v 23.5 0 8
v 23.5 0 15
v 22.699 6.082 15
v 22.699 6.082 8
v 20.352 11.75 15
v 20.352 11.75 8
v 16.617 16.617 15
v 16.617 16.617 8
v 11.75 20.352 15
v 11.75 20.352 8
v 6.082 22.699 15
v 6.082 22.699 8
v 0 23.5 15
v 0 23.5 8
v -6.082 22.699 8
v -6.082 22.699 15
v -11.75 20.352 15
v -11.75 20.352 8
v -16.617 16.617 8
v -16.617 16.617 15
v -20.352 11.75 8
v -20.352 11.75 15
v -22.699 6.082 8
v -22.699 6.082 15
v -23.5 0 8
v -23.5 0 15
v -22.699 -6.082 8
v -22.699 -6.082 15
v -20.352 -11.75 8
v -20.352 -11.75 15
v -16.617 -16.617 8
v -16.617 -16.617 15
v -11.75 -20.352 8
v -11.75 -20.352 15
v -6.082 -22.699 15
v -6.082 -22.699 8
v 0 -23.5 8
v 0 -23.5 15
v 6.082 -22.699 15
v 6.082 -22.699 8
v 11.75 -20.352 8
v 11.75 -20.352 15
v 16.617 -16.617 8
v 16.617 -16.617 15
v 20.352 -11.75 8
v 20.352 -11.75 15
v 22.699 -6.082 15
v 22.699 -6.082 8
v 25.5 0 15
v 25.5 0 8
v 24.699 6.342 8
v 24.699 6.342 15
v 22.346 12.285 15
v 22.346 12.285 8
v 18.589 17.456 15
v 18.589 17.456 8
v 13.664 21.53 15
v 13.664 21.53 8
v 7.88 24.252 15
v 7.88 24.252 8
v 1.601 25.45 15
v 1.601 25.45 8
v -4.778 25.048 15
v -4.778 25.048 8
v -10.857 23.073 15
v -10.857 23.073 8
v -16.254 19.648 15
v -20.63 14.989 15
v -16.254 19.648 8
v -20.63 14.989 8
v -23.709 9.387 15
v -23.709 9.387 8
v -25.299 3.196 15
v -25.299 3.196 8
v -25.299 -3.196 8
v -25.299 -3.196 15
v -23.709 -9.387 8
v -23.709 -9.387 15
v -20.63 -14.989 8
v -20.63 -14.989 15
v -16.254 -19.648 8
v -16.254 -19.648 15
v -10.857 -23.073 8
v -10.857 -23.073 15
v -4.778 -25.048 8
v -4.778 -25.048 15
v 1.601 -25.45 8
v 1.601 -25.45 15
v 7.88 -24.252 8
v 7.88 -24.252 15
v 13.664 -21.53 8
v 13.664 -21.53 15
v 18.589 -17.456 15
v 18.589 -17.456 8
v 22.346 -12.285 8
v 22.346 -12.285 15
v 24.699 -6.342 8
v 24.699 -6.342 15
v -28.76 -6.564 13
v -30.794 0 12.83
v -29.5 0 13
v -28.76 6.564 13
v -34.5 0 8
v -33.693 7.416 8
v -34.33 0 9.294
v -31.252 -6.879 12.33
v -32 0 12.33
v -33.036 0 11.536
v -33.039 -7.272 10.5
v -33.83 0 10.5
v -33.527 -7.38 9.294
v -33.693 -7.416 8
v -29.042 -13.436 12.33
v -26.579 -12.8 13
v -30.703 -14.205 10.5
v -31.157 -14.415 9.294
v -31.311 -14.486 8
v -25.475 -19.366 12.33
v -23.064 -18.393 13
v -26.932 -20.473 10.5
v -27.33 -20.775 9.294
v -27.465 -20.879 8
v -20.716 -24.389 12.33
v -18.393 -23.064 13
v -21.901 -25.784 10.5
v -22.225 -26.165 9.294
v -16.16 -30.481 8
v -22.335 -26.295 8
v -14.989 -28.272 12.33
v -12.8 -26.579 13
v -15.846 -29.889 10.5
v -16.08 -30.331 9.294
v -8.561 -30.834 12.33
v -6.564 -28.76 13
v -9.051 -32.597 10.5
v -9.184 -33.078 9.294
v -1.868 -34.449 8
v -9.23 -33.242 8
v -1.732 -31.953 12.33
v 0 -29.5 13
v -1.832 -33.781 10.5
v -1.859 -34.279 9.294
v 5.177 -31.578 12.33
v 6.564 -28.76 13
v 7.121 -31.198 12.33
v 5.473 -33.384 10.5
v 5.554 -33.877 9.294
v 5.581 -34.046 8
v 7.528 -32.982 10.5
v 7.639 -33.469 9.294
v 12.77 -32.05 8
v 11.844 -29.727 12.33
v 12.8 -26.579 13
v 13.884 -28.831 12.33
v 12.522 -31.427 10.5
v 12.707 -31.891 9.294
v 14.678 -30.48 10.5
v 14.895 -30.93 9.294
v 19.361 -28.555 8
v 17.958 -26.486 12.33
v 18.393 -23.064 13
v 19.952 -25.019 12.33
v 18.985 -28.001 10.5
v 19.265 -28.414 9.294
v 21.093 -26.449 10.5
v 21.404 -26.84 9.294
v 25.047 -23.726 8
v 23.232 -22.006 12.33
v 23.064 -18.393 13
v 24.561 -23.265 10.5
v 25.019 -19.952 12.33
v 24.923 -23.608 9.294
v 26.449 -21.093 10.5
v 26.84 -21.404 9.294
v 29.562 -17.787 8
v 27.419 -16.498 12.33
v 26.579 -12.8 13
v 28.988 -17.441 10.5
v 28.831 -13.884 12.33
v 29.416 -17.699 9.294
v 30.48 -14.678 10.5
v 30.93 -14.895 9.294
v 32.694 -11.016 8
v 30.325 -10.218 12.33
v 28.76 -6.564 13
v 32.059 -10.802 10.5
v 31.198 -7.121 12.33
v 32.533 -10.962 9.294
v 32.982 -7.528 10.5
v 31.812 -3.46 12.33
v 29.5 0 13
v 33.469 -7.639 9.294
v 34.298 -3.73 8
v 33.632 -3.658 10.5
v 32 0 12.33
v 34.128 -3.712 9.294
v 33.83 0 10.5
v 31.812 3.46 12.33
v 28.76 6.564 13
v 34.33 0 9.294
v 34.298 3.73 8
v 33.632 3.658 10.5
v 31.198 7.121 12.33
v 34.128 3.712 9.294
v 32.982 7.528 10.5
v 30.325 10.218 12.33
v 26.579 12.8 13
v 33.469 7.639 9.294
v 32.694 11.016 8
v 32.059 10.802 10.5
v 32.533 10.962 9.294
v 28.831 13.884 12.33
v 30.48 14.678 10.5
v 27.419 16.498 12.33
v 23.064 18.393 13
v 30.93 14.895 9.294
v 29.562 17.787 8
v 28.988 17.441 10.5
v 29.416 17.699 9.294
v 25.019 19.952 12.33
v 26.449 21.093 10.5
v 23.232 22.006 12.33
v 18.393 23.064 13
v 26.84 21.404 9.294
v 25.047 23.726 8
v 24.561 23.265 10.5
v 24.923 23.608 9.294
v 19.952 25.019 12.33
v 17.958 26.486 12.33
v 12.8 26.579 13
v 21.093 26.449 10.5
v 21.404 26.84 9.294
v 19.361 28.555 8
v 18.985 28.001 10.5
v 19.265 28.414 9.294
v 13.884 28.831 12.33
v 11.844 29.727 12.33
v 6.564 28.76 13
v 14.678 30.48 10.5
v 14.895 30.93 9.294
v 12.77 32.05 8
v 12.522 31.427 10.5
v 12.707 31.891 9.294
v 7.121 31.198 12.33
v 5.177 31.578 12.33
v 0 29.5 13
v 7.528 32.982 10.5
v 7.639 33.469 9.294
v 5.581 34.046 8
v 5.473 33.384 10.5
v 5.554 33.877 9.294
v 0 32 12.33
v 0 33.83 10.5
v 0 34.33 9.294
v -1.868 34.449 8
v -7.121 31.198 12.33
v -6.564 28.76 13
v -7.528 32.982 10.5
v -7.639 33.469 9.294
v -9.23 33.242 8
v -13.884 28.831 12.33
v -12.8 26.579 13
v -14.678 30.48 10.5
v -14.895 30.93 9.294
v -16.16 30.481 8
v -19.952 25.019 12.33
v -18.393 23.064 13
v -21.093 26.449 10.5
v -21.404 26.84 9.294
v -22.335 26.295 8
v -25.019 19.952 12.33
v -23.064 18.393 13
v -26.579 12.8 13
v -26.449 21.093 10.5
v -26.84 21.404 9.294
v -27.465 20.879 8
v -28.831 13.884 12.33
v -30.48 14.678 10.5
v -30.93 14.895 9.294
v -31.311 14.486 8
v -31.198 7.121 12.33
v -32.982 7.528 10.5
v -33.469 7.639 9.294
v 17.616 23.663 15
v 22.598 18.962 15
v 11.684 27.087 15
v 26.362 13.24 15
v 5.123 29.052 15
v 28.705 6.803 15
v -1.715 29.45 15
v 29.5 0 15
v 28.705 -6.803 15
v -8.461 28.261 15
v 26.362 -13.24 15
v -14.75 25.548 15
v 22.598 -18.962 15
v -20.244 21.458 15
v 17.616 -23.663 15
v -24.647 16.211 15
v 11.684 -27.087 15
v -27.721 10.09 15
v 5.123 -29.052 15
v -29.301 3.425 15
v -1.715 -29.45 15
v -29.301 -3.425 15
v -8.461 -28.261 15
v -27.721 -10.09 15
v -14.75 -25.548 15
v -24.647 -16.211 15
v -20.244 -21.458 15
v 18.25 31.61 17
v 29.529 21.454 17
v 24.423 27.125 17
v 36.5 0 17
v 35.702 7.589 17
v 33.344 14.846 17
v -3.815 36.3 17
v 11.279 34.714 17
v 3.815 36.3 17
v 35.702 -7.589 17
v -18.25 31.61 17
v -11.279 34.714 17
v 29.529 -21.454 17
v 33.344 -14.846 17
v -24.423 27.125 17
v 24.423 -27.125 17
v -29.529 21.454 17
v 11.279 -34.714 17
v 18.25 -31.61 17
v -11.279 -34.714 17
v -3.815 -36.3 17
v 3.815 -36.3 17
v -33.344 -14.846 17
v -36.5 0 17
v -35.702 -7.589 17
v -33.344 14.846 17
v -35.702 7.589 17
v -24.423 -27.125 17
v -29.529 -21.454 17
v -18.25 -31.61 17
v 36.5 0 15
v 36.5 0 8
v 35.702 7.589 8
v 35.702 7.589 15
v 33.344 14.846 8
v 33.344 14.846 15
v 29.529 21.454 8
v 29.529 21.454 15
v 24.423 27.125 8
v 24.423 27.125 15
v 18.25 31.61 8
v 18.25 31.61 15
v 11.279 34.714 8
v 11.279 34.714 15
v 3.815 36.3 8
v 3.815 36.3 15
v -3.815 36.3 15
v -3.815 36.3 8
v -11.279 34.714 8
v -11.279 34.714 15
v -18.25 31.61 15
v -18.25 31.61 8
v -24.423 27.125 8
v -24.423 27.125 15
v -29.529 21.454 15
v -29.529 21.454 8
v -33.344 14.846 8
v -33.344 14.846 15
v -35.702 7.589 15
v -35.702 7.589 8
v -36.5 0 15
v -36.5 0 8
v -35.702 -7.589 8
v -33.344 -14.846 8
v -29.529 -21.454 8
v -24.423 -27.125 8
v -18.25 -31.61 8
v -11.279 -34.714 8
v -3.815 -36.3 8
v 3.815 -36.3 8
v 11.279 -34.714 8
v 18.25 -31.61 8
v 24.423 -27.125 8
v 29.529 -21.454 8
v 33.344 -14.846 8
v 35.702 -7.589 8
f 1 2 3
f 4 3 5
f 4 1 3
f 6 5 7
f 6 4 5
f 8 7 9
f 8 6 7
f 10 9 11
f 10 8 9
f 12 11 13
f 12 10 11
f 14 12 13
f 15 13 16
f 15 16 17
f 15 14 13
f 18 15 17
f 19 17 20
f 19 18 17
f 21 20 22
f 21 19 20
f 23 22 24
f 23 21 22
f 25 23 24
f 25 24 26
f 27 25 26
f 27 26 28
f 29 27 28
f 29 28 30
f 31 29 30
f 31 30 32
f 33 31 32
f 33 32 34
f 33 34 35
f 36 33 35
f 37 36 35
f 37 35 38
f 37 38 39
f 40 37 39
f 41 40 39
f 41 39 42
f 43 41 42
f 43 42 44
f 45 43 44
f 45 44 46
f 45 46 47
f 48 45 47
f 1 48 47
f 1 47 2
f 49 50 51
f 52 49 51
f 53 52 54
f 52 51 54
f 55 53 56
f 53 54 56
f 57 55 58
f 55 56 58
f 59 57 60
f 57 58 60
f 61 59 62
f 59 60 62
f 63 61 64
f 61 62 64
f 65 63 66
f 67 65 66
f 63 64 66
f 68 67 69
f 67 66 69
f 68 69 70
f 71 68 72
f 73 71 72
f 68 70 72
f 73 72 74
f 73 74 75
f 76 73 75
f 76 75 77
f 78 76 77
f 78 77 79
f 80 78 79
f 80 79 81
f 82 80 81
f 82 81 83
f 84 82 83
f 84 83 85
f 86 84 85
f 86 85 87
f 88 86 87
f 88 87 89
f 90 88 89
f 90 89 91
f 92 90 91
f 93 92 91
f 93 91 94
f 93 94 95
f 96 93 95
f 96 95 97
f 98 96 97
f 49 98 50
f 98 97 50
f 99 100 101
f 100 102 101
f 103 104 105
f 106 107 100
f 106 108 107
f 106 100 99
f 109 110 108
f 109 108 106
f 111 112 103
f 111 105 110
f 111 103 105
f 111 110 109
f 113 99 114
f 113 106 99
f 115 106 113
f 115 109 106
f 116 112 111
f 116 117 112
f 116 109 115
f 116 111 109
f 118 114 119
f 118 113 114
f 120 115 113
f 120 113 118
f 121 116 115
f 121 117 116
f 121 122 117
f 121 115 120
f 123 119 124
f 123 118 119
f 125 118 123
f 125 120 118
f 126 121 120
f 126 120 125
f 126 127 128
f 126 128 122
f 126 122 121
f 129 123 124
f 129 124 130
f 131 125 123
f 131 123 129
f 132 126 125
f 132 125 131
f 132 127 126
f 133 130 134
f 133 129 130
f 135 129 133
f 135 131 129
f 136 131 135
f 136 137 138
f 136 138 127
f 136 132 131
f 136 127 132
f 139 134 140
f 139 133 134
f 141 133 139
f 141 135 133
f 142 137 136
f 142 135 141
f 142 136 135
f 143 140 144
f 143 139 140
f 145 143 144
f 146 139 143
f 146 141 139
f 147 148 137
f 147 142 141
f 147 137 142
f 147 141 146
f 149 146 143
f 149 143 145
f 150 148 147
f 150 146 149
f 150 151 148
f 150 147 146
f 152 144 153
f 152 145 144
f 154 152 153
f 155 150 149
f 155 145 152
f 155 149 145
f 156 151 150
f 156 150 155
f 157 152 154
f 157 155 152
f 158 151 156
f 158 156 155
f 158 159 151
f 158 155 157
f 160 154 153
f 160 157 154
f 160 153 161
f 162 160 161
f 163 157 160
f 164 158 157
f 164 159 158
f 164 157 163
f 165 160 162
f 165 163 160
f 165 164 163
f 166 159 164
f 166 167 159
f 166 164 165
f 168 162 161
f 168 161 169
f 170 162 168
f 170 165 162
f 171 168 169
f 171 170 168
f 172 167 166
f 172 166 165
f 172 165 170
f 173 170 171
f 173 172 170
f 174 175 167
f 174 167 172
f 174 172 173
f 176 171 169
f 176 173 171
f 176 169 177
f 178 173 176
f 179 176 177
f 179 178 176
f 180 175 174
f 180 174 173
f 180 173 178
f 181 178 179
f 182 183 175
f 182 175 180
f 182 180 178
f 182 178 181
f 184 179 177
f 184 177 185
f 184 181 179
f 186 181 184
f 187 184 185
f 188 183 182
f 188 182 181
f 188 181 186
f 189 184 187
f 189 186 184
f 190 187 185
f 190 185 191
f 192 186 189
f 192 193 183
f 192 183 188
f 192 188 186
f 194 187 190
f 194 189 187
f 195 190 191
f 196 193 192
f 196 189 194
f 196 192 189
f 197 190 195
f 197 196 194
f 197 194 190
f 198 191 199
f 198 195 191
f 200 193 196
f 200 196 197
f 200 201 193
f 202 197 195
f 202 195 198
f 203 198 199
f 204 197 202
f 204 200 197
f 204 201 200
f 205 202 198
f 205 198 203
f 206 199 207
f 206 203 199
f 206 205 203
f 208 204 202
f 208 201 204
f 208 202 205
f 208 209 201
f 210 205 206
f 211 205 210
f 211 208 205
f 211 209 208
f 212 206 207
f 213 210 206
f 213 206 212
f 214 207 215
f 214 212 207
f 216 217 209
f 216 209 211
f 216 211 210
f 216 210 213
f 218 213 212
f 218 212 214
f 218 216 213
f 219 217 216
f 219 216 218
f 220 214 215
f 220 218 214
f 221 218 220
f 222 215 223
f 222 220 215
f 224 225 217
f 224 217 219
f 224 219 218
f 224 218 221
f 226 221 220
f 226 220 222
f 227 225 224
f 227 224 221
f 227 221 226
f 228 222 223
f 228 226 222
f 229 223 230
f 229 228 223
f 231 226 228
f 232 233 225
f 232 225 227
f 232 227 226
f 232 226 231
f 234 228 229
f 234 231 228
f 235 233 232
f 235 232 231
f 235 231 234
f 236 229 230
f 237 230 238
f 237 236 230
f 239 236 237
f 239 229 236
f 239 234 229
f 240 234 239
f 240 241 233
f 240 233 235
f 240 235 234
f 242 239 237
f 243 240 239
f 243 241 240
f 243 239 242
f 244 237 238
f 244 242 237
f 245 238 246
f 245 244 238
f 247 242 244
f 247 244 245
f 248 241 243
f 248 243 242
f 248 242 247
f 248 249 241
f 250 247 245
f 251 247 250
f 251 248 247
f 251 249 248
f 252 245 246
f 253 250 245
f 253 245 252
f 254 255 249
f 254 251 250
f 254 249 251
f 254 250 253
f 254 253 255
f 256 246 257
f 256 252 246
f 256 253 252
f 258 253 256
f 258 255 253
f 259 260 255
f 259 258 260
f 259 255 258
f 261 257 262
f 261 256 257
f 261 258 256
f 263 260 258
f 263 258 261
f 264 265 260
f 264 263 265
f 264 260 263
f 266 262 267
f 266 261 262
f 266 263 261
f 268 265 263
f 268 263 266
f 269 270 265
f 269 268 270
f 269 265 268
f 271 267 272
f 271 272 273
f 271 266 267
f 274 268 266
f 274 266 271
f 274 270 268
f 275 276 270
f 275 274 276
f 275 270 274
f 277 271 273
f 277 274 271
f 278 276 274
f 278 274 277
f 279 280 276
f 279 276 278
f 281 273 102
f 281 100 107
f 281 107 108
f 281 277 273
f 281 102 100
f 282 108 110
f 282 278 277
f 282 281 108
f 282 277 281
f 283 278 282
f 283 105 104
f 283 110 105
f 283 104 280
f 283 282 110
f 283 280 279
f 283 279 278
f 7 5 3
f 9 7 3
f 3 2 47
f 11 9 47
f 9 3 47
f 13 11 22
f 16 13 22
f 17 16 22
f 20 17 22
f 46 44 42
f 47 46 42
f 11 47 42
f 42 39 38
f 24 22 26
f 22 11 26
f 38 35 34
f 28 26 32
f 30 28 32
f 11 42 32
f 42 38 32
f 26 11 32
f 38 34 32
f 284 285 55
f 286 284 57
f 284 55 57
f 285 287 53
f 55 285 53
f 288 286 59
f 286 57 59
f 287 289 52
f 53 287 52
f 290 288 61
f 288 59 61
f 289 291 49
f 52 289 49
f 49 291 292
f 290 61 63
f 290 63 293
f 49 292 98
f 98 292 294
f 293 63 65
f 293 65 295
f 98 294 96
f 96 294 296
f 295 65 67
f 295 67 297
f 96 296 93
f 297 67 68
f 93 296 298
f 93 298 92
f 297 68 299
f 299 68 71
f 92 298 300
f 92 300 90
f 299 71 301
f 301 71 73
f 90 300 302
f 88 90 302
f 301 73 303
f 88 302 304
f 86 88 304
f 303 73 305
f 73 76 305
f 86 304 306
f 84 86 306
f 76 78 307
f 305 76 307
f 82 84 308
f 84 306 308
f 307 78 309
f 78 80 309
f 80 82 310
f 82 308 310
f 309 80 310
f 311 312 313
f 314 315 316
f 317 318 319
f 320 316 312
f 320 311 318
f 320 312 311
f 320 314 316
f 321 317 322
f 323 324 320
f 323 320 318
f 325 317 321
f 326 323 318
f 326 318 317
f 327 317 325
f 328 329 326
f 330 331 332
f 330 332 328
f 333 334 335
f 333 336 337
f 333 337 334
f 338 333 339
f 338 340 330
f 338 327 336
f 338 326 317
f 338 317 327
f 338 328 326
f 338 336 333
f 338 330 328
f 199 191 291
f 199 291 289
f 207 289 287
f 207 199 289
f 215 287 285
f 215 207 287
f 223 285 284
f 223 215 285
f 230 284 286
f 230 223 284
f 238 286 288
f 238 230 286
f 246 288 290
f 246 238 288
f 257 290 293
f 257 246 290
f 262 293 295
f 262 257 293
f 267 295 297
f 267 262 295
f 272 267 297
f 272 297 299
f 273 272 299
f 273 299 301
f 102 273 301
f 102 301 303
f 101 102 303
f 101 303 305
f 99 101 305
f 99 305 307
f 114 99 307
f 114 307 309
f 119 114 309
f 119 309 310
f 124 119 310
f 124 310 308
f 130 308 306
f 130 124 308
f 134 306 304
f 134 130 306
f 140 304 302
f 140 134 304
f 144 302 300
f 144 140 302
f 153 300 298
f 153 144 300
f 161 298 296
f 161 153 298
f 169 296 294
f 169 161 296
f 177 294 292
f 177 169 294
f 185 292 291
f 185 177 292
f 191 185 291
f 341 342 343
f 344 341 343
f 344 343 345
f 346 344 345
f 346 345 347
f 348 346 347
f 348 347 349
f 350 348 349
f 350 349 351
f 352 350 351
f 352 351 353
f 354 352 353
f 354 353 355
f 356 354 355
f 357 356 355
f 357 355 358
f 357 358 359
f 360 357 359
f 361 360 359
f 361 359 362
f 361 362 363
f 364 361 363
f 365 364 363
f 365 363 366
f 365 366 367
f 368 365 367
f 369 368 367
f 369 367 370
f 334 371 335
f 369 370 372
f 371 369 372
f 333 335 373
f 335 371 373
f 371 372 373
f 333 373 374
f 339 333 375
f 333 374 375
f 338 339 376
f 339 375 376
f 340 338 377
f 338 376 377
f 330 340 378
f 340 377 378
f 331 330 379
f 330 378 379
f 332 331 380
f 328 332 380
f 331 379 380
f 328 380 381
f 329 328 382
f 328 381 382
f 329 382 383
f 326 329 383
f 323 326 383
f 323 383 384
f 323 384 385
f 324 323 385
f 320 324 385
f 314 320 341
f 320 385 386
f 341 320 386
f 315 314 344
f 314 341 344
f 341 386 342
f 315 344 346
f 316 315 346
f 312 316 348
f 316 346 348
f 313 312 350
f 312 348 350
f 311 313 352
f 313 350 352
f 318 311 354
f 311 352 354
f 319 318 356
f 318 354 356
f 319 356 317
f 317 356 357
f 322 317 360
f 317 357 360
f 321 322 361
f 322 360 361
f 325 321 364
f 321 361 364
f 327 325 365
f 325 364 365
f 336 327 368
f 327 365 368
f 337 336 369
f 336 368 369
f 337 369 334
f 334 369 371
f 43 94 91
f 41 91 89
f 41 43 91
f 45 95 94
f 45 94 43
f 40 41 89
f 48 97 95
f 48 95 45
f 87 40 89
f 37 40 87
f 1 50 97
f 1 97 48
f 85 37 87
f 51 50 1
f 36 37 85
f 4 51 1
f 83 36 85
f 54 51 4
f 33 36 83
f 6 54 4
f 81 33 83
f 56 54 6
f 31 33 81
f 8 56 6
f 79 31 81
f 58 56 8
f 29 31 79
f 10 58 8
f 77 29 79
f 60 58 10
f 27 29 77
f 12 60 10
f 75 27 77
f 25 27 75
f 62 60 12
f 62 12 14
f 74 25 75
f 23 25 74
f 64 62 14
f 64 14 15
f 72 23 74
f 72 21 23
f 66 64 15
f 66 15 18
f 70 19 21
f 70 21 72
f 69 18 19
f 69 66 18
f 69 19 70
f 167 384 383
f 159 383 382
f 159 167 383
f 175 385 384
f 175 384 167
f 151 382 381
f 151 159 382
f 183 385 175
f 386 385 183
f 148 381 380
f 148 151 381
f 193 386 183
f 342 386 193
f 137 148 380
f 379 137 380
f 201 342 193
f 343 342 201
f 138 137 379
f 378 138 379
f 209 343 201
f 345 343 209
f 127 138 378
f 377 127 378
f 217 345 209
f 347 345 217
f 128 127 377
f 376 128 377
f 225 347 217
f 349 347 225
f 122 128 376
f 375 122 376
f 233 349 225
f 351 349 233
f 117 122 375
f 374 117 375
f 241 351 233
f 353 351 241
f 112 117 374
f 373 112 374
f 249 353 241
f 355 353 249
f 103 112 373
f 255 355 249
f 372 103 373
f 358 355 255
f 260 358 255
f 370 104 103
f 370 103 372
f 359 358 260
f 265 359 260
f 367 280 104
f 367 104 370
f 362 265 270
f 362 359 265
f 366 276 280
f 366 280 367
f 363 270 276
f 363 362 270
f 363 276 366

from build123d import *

# Parameters (mm, degrees)
SKETCH_1_R          = 25.5
SKETCH_1_R_2        = 23.5
EXTRUDE_2_DEPTH     = 15
SKETCH_3_R          = 36.5
SKETCH_3_R_2        = 29.5
EXTRUDE_3_DEPTH     = 15
SKETCH_6_R          = 47.852289075
CUT_EXTRUDE_1_DEPTH = 8
SKETCH_9_R          = 36.5
EXTRUDE_5_DEPTH     = 2


with BuildPart() as part:
    # 草图1 → 凸台-拉伸2 (new body)
    with BuildSketch(Plane.XY):
        Circle(SKETCH_1_R)
        Circle(SKETCH_1_R_2, mode=Mode.SUBTRACT)
    extrude(amount=EXTRUDE_2_DEPTH)


with BuildPart() as body_2:
    # 草图3 → 凸台-拉伸3 (new body)
    with BuildSketch(Plane.XY):
        Circle(SKETCH_3_R)
        Circle(SKETCH_3_R_2, mode=Mode.SUBTRACT)
    extrude(amount=EXTRUDE_3_DEPTH)

    # 草图5 → 切除-旋转2 (revolve, cut)
    with BuildSketch(Plane(origin=(0, 0, 0), x_dir=(1, 0, 0), z_dir=(0, 1, 0))):
        with BuildLine():
            Line((-29.5, -3), (-29.5, -13))
            ThreePointArc((-29.5, -13), (-34.5, -8), (-29.5, -3))
        make_face()
    revolve(axis=Axis((0, 0, 0), (0, 0, 1)), mode=Mode.SUBTRACT)


with BuildPart() as cut_extrude_1_tool:
    # 草图6 → 切除-拉伸1 (new body)
    with BuildSketch(Plane(origin=(0, 0, 0), x_dir=(-1, 0, 0), z_dir=(0, 0, -1))):
        Circle(SKETCH_6_R)
    extrude(amount=-CUT_EXTRUDE_1_DEPTH)


with BuildPart() as part_1:
    add(part.part)

    # 切除-拉伸1: cut by cut_extrude_1_tool
    add(cut_extrude_1_tool.part, mode=Mode.SUBTRACT)



with BuildPart() as body_2_1:
    add(body_2.part)

    # 切除-拉伸1: cut by cut_extrude_1_tool
    add(cut_extrude_1_tool.part, mode=Mode.SUBTRACT)


with BuildPart() as part_2:
    add(part_1.part)

    add(body_2_1.part)  # 凸台-拉伸5 merges body 2
    # 草图9 → 凸台-拉伸5 (add)
    with BuildSketch(Plane.XY.offset(15)):
        with Locations(Location((0, 0, 0), (0, 0, 180))):
            Circle(SKETCH_9_R)
    extrude(amount=EXTRUDE_5_DEPTH)


solid = part_2.part
